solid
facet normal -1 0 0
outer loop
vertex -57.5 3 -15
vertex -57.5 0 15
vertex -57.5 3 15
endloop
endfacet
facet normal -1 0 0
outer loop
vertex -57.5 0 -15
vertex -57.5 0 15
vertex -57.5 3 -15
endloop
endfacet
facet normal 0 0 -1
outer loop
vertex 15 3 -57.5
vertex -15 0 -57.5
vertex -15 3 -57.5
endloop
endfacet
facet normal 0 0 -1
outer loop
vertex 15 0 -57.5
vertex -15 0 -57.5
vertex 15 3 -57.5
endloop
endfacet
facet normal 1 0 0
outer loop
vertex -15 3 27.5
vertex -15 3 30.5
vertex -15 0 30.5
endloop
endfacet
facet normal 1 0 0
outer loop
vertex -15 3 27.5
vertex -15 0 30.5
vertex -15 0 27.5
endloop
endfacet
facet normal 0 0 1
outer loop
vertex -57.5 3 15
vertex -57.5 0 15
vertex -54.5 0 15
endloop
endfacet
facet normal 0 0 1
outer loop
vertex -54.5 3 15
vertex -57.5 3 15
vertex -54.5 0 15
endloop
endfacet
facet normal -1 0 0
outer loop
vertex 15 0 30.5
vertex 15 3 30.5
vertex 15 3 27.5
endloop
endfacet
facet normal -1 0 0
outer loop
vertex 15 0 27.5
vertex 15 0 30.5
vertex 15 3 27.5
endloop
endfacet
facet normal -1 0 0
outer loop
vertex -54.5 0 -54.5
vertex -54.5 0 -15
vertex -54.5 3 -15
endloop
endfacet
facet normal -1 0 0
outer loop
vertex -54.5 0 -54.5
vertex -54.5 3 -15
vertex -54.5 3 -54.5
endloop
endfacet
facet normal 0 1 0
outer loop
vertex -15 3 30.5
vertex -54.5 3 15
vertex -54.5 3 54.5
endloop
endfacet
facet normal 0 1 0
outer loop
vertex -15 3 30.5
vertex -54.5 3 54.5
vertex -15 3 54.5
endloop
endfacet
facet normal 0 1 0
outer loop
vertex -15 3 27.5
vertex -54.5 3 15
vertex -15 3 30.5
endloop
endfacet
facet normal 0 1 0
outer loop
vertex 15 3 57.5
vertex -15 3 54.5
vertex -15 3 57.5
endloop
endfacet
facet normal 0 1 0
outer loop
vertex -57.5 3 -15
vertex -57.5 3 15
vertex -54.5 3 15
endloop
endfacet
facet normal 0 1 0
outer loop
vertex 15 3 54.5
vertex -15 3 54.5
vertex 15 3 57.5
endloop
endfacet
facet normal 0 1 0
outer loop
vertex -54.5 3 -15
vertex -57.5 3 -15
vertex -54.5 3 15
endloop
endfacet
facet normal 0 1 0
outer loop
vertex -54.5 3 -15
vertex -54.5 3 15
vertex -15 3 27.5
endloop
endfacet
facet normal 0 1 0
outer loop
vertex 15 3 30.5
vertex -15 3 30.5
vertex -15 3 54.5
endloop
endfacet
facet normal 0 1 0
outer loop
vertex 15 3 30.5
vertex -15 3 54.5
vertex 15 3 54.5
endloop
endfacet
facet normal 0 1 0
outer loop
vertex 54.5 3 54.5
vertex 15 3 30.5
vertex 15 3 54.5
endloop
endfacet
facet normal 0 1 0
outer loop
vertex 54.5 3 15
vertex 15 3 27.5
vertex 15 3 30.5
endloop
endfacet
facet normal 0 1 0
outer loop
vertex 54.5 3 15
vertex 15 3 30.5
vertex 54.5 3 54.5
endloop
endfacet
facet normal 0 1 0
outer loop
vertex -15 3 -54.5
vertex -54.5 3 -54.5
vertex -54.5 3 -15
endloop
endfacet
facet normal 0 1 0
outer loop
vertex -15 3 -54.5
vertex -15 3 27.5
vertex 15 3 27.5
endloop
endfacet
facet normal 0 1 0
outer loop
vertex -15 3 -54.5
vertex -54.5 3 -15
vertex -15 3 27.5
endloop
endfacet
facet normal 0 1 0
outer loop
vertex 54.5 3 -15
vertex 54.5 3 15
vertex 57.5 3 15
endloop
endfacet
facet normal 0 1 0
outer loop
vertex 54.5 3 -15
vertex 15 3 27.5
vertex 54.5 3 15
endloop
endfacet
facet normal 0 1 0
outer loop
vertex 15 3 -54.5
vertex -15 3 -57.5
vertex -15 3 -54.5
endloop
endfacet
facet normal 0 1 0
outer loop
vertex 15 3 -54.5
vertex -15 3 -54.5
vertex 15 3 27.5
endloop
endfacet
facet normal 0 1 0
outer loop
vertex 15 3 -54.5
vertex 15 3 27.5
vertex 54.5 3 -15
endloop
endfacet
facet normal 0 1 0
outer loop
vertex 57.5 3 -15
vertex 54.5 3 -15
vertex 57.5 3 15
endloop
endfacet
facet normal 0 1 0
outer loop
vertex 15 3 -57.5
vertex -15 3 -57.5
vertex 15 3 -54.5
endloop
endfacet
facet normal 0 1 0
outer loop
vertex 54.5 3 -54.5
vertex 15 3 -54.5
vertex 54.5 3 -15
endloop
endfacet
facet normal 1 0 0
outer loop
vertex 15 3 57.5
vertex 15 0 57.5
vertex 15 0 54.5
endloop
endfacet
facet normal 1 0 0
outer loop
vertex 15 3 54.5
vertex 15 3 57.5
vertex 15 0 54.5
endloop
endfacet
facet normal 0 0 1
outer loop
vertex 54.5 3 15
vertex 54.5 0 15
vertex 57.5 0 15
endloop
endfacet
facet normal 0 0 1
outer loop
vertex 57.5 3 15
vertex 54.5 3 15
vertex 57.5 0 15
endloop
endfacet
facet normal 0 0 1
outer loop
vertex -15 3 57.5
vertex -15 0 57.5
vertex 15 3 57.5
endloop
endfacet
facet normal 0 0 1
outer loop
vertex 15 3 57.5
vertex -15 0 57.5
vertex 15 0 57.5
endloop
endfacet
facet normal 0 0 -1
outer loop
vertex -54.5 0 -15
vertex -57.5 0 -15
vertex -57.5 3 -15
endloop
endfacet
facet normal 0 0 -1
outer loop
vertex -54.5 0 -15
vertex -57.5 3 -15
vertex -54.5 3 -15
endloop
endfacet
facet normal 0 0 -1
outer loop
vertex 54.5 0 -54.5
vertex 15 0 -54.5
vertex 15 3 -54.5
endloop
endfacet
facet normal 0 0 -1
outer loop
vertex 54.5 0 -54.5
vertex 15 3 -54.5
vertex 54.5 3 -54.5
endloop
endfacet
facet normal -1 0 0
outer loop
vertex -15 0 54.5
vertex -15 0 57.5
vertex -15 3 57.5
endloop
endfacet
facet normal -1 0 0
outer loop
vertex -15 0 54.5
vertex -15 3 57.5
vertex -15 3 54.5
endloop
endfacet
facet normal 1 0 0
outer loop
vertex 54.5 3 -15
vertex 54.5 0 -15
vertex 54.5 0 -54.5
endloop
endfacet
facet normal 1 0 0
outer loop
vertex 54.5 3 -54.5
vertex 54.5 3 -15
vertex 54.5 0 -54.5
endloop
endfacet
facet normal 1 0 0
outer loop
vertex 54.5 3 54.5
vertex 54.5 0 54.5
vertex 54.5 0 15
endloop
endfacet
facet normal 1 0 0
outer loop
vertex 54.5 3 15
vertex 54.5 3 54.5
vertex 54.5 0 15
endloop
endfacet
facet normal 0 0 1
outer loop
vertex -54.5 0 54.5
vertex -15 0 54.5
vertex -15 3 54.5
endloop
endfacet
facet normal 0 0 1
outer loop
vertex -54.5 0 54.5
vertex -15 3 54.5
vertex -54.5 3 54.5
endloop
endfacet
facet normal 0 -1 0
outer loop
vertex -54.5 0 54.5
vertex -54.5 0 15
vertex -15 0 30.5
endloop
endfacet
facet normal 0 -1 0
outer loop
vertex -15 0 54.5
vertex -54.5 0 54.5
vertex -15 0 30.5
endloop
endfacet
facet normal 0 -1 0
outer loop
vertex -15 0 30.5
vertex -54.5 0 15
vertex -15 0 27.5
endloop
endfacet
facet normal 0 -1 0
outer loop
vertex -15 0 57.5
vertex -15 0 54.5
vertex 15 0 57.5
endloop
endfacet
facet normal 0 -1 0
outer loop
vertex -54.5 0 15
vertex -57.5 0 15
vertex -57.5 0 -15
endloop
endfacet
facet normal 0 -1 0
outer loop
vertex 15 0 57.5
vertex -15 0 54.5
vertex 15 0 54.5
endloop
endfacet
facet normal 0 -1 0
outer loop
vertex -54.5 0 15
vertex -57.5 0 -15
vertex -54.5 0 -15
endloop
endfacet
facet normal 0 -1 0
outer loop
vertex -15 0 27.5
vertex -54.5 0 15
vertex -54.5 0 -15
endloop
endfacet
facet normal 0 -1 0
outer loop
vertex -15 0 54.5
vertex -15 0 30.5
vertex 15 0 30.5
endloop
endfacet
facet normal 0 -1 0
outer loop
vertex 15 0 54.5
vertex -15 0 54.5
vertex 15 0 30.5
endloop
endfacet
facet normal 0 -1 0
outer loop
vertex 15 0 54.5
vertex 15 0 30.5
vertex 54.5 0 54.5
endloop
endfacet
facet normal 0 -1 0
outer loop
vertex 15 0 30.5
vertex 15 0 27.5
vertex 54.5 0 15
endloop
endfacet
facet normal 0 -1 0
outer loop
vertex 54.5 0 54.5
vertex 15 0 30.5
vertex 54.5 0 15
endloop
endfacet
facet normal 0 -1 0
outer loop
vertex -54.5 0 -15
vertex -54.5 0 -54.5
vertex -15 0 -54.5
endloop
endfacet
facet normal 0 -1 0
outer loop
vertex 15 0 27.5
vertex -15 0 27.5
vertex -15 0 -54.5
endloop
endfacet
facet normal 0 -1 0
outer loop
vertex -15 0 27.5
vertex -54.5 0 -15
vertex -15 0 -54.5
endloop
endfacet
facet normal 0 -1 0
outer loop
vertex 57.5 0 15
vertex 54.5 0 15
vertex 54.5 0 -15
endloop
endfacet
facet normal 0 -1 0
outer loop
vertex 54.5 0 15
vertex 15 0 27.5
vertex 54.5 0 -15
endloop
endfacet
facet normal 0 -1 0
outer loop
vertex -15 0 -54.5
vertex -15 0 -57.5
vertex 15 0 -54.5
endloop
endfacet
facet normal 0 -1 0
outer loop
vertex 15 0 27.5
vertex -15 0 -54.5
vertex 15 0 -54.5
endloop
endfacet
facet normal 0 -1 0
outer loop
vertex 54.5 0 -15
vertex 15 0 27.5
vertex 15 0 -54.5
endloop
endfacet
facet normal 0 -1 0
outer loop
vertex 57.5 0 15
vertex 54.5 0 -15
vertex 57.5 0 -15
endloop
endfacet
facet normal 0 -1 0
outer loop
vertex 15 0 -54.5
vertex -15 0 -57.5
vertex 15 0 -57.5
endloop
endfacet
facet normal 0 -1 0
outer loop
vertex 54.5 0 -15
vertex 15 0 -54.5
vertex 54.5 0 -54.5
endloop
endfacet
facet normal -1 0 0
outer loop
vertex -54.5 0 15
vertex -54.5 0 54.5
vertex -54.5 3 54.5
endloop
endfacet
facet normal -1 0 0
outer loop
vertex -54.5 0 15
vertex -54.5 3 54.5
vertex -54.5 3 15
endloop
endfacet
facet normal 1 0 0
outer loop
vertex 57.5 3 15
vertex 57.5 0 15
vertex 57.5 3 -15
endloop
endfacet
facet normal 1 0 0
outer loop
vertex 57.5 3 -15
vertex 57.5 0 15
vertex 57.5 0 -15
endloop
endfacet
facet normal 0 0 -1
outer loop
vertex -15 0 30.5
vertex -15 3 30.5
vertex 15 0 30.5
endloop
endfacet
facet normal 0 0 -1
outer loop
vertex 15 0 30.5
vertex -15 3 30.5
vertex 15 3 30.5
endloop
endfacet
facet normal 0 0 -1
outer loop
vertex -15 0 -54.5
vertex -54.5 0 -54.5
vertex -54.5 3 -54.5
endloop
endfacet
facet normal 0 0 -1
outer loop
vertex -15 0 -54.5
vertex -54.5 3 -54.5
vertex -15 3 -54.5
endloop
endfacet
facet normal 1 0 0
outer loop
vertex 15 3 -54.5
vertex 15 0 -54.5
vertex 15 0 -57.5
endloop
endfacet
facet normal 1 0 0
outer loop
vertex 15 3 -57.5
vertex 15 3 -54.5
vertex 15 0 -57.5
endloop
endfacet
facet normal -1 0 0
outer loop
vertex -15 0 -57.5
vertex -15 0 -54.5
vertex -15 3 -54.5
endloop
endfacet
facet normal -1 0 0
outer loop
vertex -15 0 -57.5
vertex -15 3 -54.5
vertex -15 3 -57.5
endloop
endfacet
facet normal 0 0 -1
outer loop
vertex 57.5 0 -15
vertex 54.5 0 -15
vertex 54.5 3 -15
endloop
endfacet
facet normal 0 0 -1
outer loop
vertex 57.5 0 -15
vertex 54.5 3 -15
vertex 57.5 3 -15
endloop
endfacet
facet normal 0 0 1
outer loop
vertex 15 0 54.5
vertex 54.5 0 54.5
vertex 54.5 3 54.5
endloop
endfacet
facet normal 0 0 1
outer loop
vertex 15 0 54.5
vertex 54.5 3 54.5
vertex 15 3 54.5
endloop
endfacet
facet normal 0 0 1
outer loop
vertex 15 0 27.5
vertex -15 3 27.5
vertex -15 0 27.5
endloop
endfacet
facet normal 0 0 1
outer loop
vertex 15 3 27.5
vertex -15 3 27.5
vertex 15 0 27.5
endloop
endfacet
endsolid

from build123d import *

# Parameters (mm, degrees)
SKETCH1_W           = 30
SKETCH1_H           = 3
SKETCH1_W_2         = 3
SKETCH1_H_2         = 30
BOSS_EXTRUDE1_DEPTH = 3
SKETCH2_W           = 30
SKETCH2_H           = 3
CUT_EXTRUDE1_DEPTH  = 10


with BuildPart() as part:
    # Sketch1 → Boss-Extrude1 (new body)
    with BuildSketch(Plane(origin=(0, 0, 0), x_dir=(1, 0, 0), z_dir=(0, 1, 0))):
        with Locations((0, -56)):
            Rectangle(SKETCH1_W, SKETCH1_H)
        with Locations((-56, 0)):
            Rectangle(SKETCH1_W_2, SKETCH1_H_2)
        with Locations((0, 56)):
            Rectangle(SKETCH1_W, SKETCH1_H)
        Polygon((-54.5, -54.5), (-54.5, -15), (-54.5, 15), (-54.5, 54.5), (-15, 54.5), (15, 54.5), (54.5, 54.5), (54.5, 15), (54.5, -15), (54.5, -54.5), (15, -54.5), (-15, -54.5), align=None)
        with Locations((56, 0)):
            Rectangle(SKETCH1_W_2, SKETCH1_H_2)
    extrude(amount=BOSS_EXTRUDE1_DEPTH)

    # Sketch2 → Cut-Extrude1 (cut)
    with BuildSketch(Plane(origin=(0, 3, 0), x_dir=(1, 0, 0), z_dir=(0, 1, 0))):
        with Locations((0, -29)):
            Rectangle(SKETCH2_W, SKETCH2_H)
    extrude(amount=-CUT_EXTRUDE1_DEPTH, mode=Mode.SUBTRACT)


solid = part.part
